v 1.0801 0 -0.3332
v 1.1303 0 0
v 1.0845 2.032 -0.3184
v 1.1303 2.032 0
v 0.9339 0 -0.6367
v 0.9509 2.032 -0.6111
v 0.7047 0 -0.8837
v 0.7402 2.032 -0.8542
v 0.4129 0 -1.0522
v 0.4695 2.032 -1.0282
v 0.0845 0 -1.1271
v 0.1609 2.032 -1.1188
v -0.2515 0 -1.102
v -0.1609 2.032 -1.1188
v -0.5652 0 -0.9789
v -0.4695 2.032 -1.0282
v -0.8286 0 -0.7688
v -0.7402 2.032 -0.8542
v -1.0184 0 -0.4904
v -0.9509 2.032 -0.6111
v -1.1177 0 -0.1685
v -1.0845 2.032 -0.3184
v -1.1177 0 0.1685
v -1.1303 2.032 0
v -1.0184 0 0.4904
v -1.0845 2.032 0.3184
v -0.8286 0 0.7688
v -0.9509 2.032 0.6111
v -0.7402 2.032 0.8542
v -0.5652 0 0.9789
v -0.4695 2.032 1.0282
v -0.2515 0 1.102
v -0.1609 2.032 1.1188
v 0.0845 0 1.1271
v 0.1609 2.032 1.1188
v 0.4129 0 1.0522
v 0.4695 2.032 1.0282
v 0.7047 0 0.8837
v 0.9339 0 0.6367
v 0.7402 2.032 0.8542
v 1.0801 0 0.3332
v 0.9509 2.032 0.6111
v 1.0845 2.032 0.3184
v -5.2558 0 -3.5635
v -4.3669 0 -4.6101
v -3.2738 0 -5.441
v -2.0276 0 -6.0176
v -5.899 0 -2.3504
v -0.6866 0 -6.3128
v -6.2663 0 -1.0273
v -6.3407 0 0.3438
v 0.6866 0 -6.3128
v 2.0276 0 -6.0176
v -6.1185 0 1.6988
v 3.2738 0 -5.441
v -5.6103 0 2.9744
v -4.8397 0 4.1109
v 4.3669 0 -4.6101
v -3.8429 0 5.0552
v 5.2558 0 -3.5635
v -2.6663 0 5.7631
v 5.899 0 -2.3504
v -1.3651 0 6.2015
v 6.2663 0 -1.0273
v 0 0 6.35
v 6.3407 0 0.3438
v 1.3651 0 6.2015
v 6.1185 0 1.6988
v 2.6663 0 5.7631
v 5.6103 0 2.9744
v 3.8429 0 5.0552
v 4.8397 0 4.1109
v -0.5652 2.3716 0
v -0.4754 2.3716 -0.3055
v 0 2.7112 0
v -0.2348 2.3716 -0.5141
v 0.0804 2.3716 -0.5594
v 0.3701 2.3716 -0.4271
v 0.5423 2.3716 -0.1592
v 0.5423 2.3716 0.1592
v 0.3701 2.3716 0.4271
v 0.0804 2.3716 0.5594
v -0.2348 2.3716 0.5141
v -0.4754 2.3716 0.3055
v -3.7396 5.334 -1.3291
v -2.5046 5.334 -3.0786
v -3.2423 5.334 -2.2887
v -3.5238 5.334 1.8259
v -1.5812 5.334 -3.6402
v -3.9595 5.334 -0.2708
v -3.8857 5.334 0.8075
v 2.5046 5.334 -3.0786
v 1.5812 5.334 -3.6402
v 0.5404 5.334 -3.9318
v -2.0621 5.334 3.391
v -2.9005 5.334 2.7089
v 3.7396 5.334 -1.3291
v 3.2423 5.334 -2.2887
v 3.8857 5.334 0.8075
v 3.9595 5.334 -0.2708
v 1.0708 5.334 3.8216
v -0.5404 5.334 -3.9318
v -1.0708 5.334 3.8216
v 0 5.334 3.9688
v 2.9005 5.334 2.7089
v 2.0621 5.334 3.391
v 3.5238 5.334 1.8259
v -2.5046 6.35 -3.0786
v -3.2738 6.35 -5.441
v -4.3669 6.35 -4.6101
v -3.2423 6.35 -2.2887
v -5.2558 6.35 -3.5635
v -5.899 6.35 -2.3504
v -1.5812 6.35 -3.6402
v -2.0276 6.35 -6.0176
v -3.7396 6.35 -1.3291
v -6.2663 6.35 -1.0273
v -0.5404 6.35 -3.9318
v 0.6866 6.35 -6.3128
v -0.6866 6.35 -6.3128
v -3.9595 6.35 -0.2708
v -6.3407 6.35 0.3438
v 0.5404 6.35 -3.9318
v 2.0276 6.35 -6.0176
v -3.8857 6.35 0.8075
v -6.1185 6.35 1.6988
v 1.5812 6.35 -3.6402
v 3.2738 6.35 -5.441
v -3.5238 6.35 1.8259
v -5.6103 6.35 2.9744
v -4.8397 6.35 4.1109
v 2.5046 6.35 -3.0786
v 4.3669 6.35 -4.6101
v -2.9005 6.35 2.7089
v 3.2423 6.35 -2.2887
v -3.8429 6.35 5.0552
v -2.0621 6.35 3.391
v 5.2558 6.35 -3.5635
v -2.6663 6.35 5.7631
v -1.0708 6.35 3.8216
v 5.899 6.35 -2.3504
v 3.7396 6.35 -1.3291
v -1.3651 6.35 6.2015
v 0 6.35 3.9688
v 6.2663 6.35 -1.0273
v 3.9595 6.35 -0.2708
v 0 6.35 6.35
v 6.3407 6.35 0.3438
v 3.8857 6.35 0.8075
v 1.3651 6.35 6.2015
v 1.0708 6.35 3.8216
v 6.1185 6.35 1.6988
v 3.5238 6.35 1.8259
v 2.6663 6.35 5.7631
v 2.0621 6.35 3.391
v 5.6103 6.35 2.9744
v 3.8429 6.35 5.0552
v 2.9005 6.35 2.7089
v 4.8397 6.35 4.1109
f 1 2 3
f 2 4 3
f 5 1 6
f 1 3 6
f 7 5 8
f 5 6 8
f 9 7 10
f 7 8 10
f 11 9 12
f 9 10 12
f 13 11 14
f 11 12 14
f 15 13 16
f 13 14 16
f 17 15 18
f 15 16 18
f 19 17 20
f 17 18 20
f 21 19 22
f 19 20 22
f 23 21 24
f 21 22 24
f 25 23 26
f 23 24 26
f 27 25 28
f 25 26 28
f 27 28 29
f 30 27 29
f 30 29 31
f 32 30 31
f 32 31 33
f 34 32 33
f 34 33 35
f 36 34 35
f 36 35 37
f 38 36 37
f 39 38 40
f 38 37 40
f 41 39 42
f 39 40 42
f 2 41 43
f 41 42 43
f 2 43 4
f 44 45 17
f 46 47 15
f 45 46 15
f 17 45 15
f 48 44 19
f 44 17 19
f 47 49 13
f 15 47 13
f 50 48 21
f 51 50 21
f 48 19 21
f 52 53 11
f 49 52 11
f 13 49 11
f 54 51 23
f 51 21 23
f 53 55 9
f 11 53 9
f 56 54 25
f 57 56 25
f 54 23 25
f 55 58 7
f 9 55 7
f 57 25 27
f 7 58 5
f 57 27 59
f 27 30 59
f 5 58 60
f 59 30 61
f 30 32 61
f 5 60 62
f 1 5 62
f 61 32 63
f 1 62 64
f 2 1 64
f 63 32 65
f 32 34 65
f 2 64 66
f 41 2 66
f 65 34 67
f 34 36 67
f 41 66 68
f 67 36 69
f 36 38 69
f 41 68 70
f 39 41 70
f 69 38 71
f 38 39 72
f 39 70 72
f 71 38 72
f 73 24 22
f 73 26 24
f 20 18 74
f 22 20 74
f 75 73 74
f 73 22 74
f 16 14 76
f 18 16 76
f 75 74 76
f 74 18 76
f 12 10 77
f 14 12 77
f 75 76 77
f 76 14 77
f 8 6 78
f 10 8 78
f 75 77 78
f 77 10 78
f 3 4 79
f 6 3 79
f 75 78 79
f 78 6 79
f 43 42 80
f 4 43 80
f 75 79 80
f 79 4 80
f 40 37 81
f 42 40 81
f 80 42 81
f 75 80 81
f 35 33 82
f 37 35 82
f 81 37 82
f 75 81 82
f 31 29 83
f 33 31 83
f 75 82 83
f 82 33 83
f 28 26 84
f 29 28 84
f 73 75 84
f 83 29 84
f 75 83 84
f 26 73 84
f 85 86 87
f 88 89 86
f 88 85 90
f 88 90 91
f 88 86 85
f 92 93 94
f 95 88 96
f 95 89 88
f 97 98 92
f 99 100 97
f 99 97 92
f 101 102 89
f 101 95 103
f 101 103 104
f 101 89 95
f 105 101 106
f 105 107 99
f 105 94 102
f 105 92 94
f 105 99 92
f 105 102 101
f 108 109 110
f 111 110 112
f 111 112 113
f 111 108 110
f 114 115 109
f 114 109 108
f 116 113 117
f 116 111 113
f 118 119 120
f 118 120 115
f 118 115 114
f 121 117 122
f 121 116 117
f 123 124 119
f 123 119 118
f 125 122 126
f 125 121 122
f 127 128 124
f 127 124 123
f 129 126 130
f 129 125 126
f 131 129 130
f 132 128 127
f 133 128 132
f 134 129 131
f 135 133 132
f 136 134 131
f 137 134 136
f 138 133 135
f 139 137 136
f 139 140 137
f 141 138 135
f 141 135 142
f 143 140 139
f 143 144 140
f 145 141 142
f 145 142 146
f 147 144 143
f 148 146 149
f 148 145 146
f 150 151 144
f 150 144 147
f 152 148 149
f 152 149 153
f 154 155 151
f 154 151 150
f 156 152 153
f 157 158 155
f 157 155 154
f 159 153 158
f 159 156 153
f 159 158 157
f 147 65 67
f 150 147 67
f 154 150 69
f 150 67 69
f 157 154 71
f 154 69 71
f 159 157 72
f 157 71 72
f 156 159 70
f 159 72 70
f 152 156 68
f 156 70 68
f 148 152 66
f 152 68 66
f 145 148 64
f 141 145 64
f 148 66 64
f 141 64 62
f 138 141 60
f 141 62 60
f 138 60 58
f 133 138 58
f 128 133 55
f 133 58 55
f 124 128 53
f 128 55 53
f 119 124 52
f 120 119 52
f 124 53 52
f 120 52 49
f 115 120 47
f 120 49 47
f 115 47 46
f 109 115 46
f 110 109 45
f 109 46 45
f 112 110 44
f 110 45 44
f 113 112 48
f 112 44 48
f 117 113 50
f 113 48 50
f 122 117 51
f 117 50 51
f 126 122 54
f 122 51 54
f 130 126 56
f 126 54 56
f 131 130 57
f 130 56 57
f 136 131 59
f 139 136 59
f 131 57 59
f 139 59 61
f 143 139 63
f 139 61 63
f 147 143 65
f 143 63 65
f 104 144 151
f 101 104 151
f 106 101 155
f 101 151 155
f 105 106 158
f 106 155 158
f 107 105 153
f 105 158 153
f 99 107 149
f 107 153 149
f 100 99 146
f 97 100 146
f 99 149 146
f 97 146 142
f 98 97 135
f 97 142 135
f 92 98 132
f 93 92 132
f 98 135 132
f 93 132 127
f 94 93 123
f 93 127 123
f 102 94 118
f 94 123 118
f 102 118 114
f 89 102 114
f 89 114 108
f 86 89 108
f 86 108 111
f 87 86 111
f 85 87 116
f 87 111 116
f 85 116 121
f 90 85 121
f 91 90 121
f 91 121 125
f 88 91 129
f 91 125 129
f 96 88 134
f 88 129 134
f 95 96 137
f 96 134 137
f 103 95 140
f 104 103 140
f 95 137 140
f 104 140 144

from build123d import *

# Parameters (mm, degrees)
SKETCH1_R                 = 6.35
BOSS_EXTRUDE1_DEPTH       = 6.35
SKETCH2_R                 = 3.96875
CUT_EXTRUDE1_DEPTH        = 1.016
F_4_40_TAPPED_HOLE1_D     = 2.2606
F_4_40_TAPPED_HOLE1_DEPTH = 2.032
F_4_40_TAPPED_HOLE1_TIP   = 0.679152758


with BuildPart() as part:
    # Sketch1 → Boss-Extrude1 (new body)
    with BuildSketch(Plane(origin=(0, 0, 0), x_dir=(1, 0, 0), z_dir=(0, 1, 0))):
        with Locations(Location((0, 0, 0), (0, 0, 270))):
            Circle(SKETCH1_R)
    extrude(amount=BOSS_EXTRUDE1_DEPTH)

    # Sketch2 → Cut-Extrude1 (cut)
    with BuildSketch(Plane(origin=(0, 6.35, 0), x_dir=(1, 0, 0), z_dir=(0, 1, 0))):
        with Locations(Location((0, 0, 0), (0, 0, 270))):
            Circle(SKETCH2_R)
    extrude(amount=-CUT_EXTRUDE1_DEPTH, mode=Mode.SUBTRACT)

    # #4-40 Tapped Hole1
    with Locations(Plane(origin=(0, 0, 0), x_dir=(-1, 0, 0), z_dir=(0, -1, 0))):
        with Locations((0, 0)):
            Hole(F_4_40_TAPPED_HOLE1_D / 2, depth=F_4_40_TAPPED_HOLE1_DEPTH)
            with Locations((0, 0, -(F_4_40_TAPPED_HOLE1_DEPTH + F_4_40_TAPPED_HOLE1_TIP / 2))):  # 118° drill point
                Cone(0, F_4_40_TAPPED_HOLE1_D / 2, F_4_40_TAPPED_HOLE1_TIP, mode=Mode.SUBTRACT)


solid = part.part
